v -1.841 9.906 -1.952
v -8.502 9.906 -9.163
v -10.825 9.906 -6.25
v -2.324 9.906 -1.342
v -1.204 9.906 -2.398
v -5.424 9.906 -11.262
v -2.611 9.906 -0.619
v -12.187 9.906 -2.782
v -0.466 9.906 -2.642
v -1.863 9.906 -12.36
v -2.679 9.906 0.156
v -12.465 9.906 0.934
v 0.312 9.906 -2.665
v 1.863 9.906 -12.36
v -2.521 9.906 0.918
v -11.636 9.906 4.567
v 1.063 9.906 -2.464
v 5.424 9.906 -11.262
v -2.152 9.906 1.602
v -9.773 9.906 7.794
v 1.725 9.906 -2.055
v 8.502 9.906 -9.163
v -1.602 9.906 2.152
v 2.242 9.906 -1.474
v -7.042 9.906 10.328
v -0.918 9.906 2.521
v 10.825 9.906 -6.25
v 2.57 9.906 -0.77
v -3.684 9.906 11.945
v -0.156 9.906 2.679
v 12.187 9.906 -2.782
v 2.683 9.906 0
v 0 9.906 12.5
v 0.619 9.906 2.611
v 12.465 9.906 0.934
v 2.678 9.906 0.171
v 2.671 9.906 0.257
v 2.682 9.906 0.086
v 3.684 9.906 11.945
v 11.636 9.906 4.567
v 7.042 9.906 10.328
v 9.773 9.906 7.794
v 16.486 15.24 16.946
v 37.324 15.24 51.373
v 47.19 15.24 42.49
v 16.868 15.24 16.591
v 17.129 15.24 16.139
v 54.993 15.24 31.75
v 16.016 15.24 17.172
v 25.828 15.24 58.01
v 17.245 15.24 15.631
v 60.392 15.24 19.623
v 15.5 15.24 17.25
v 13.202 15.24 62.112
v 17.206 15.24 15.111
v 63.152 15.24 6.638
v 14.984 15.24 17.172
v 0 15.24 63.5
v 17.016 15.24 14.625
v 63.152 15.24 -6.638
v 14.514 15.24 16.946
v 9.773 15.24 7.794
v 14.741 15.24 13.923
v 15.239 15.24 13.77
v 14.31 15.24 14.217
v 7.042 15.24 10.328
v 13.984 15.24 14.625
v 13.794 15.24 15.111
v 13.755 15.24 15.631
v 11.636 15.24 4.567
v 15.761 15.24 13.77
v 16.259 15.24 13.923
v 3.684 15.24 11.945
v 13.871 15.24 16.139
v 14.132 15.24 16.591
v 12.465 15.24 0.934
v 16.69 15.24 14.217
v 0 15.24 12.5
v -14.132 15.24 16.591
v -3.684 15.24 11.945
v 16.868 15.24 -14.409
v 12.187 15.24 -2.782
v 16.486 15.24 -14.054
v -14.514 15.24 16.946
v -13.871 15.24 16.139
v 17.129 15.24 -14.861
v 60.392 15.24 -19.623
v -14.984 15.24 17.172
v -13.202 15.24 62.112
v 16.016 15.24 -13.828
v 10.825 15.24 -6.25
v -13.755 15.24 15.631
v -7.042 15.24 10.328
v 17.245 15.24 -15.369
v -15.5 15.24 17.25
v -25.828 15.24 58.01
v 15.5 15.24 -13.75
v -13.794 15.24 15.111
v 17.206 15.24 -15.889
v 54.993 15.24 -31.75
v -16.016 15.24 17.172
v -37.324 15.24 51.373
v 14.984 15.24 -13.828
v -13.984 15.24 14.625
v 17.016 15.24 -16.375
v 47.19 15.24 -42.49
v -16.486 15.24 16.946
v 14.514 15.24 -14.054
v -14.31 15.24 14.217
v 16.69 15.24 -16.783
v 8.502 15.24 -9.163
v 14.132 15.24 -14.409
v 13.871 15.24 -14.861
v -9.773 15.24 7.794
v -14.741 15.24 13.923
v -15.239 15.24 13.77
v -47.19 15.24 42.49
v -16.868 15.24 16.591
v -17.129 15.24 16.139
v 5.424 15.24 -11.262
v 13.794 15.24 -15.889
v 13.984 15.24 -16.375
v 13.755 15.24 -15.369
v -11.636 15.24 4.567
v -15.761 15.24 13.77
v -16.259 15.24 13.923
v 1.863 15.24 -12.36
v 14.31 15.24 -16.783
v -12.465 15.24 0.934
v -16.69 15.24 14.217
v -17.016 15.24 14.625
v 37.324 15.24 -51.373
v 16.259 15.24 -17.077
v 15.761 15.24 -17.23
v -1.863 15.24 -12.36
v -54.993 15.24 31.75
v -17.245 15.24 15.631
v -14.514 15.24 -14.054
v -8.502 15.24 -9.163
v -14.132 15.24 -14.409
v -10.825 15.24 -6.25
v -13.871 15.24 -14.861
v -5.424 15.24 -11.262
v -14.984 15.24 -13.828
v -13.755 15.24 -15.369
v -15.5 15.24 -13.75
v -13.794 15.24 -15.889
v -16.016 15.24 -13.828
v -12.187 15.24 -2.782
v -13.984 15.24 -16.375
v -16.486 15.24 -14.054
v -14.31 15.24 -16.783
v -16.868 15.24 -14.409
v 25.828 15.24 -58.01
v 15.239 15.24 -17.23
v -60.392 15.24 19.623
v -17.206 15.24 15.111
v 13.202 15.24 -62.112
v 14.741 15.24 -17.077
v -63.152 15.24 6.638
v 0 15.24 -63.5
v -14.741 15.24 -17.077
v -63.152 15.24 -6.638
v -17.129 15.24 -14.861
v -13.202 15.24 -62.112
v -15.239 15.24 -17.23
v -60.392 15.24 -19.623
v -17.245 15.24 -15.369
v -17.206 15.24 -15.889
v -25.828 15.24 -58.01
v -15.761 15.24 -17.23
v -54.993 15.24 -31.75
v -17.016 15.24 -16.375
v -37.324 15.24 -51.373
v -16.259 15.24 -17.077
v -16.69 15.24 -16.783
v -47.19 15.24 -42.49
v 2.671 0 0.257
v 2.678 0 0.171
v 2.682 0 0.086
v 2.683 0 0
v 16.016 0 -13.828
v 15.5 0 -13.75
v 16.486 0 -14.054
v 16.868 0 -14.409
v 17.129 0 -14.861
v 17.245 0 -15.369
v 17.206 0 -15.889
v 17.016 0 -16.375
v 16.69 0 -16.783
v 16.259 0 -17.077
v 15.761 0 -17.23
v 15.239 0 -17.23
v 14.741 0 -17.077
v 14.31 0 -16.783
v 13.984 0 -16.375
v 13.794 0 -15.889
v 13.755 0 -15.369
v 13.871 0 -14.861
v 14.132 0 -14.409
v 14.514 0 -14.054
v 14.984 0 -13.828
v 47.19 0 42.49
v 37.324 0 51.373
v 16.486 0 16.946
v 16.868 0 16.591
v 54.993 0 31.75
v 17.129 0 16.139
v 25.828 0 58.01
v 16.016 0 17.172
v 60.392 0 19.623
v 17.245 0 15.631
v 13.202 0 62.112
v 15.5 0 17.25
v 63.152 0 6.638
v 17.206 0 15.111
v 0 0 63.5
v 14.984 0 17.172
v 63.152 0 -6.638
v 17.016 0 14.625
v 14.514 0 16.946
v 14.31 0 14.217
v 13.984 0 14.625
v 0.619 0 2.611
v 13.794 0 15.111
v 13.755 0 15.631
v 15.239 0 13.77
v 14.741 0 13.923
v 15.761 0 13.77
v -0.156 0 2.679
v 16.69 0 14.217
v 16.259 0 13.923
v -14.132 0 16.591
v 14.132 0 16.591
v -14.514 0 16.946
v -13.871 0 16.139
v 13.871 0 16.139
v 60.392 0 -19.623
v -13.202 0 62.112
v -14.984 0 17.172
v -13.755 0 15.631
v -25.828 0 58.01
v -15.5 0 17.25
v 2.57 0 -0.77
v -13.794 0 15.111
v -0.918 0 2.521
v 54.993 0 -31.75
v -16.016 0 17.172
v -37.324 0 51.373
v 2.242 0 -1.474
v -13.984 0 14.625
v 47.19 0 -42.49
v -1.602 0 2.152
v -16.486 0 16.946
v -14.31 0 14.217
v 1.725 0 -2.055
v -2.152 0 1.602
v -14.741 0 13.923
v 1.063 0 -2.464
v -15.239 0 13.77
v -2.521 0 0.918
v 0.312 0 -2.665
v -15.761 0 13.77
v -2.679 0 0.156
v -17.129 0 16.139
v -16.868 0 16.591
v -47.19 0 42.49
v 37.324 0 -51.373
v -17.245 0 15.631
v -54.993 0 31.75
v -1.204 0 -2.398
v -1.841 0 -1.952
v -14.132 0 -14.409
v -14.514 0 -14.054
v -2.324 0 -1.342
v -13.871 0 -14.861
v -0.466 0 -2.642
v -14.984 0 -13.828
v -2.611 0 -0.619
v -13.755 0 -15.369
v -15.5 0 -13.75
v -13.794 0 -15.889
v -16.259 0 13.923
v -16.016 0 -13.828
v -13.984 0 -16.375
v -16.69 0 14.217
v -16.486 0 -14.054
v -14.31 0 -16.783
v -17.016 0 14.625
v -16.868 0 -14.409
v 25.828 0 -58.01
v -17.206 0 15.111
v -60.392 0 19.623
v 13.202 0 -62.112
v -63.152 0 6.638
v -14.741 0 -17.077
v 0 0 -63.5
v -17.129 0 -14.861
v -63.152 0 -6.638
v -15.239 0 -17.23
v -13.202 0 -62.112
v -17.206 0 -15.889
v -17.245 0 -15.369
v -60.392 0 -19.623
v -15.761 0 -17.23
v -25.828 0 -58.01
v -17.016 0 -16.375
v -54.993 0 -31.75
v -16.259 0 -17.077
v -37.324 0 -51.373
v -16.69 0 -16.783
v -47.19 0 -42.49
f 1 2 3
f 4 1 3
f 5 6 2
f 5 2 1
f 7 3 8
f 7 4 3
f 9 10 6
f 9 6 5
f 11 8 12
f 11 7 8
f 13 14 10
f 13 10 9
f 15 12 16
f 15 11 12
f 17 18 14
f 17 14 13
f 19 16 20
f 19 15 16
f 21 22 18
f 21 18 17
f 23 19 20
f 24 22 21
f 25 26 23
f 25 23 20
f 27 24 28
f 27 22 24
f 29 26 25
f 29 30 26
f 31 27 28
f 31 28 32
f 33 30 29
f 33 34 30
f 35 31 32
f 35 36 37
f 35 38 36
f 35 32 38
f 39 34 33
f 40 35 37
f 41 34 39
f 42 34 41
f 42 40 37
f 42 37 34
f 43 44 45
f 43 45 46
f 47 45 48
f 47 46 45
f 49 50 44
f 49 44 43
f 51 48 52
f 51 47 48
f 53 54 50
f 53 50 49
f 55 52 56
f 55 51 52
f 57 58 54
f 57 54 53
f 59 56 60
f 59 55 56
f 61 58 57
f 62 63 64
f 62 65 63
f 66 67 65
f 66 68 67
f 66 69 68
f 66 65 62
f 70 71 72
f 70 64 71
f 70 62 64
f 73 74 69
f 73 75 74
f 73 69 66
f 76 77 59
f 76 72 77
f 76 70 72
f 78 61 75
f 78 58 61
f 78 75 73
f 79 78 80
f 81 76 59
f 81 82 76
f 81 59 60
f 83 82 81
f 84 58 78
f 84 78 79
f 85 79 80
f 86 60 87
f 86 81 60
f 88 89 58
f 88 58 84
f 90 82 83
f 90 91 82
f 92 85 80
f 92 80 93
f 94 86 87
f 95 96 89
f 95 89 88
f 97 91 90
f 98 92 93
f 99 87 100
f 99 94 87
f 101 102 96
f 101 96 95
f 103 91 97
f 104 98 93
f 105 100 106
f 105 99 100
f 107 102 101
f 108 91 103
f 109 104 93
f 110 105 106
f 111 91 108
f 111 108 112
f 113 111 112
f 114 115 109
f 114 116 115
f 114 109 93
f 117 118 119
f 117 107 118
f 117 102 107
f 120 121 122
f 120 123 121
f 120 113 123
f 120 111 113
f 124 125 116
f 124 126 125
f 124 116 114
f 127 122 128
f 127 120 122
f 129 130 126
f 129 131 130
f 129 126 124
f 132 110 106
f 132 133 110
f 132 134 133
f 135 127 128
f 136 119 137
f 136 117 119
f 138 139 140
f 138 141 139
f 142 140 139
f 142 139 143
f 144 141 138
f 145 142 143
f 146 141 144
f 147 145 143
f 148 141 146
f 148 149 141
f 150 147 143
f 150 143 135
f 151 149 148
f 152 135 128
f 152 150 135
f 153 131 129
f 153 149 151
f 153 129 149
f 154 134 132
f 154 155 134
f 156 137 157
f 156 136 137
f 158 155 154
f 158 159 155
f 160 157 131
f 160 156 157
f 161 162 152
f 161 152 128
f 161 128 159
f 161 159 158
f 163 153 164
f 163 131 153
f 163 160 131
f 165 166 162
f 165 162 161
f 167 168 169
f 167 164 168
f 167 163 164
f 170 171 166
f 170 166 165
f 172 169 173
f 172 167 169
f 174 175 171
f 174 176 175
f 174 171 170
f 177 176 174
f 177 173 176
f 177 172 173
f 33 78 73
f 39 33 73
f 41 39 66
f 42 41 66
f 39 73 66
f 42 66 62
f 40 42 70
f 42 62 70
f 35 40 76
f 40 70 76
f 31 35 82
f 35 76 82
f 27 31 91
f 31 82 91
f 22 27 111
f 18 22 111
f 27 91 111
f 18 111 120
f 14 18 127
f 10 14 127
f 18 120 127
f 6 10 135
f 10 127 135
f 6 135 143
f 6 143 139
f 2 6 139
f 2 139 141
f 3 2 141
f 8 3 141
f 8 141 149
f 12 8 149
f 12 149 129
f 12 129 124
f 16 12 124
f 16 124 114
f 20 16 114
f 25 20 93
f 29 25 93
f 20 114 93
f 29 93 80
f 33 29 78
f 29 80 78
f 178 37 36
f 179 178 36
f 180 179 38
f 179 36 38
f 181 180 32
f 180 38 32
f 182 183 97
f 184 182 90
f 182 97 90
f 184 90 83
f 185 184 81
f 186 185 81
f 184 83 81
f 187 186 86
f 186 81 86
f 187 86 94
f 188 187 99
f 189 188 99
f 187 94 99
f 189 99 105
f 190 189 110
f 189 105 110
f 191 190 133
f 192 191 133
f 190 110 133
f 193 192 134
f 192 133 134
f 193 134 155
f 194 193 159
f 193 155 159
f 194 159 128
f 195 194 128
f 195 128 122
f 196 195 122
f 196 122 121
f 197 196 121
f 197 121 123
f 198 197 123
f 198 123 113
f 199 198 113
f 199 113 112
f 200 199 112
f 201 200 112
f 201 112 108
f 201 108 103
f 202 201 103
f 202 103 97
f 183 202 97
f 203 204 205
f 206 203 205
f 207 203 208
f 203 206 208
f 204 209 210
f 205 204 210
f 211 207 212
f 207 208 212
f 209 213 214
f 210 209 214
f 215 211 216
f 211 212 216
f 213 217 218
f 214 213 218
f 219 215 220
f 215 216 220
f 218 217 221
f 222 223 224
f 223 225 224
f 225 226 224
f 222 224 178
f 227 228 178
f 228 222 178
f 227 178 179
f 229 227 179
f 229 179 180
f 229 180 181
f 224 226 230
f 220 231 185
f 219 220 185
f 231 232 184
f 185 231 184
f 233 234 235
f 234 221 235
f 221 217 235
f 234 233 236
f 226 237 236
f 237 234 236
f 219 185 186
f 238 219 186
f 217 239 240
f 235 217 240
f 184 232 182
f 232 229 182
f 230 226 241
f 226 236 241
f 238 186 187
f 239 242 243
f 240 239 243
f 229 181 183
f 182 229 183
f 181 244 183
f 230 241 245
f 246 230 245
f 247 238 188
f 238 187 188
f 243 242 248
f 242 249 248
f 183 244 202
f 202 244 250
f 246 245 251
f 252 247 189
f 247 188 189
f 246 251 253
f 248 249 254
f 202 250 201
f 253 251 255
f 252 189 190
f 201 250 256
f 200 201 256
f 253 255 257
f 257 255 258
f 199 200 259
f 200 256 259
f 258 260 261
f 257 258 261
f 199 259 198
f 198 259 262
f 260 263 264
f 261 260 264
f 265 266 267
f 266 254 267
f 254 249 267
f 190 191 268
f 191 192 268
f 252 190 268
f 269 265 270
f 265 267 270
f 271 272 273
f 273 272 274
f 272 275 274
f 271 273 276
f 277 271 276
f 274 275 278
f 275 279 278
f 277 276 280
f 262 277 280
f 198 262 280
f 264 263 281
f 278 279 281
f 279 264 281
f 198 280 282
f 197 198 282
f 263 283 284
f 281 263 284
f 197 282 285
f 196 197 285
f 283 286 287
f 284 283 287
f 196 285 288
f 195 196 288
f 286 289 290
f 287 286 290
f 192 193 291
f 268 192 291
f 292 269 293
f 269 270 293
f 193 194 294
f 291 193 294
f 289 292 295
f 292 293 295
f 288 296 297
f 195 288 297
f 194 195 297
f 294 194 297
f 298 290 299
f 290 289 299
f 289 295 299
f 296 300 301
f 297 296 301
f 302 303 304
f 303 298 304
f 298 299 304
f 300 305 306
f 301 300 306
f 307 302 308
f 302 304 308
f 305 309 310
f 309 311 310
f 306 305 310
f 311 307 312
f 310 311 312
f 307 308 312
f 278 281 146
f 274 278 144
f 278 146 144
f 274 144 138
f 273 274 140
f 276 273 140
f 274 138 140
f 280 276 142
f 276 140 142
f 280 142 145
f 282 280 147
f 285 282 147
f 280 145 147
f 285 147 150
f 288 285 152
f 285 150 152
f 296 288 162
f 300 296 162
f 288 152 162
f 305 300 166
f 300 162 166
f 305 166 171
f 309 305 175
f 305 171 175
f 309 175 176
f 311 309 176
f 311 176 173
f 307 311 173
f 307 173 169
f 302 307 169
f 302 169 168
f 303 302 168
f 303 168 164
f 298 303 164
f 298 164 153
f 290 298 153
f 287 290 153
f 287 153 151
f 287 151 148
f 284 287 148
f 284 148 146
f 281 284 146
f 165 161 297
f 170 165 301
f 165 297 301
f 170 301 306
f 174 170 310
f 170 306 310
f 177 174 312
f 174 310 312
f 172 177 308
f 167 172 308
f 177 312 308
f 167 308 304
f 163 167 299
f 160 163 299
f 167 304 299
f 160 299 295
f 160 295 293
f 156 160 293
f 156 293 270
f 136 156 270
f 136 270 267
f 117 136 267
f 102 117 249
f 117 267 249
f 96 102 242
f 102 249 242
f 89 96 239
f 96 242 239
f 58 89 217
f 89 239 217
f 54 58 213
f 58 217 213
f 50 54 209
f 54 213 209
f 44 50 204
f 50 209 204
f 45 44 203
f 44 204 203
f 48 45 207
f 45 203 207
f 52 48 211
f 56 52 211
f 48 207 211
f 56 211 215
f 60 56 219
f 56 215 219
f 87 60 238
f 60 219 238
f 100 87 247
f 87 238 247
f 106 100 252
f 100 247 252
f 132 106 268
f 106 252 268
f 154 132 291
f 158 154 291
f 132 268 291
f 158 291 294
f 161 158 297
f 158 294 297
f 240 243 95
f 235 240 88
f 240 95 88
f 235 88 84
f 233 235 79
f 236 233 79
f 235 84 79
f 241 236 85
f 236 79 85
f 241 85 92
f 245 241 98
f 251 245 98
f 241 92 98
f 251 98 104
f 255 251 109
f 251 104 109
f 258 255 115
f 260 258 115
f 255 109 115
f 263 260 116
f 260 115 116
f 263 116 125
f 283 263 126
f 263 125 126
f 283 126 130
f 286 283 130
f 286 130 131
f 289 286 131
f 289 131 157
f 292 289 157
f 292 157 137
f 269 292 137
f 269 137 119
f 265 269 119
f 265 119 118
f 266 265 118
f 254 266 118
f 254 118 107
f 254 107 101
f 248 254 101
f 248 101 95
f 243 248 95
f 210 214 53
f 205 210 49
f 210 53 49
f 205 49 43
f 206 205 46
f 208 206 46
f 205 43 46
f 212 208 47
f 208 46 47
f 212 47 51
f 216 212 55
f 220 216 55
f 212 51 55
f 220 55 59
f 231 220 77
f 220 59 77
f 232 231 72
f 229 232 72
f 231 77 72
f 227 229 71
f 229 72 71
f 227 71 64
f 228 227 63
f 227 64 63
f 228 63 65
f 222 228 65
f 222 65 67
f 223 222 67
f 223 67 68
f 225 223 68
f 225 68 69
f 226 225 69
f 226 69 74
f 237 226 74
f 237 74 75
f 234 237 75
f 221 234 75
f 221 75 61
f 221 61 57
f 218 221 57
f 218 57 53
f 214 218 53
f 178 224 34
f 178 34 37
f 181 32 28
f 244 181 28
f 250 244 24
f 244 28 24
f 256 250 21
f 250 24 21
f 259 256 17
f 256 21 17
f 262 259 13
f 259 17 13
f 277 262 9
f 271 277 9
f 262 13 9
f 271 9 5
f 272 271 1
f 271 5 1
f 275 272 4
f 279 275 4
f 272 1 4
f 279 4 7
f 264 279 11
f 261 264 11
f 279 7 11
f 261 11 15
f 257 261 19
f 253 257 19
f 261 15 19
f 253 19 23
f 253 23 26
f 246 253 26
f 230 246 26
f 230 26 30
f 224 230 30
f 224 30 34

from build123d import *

# Parameters (mm, degrees)
SKETCH2_R           = 63.5
BOSS_EXTRUDE1_DEPTH = 15.24
CUT_EXTRUDE3_DEPTH  = 92.086539071
SKETCH4_R           = 1.75
CUT_EXTRUDE4_DEPTH  = 55.626
SKETCH5_R           = 12.5
CUT_EXTRUDE5_DEPTH  = 5.334


with BuildPart() as part:
    # Sketch2 → Boss-Extrude1 (new body)
    with BuildSketch(Plane(origin=(0, 0, 0), x_dir=(1, 0, 0), z_dir=(0, 1, 0))):
        Circle(SKETCH2_R)
    extrude(amount=BOSS_EXTRUDE1_DEPTH)

    # Sketch3 → Cut-Extrude3 (cut, through all)
    with BuildSketch(Plane(origin=(0, 15.24, 0), x_dir=(1, 0, 0), z_dir=(0, 1, 0))):
        with BuildLine():
            ThreePointArc((2.683094535, 0), (-2.104641397, 1.664175734), (0.618701471, -2.610786237))
            Line((0.618701471, -2.610786237), (2.670795382, -0.25660926))
            ThreePointArc((2.670795382, -0.25660926), (2.680017983, -0.128451918), (2.683094535, 0))
        make_face()
    extrude(amount=-CUT_EXTRUDE3_DEPTH, mode=Mode.SUBTRACT)

    # Sketch4 → Cut-Extrude4 (cut)
    with BuildSketch(Plane(origin=(0, 15.24, 0), x_dir=(1, 0, 0), z_dir=(0, 1, 0))):
        with Locations((-15.5, 15.5)):
            Circle(SKETCH4_R)
        with Locations((15.5, 15.5)):
            Circle(SKETCH4_R)
        with Locations((15.5, -15.5)):
            Circle(SKETCH4_R)
        with Locations((-15.5, -15.5)):
            Circle(SKETCH4_R)
    extrude(amount=-CUT_EXTRUDE4_DEPTH, mode=Mode.SUBTRACT)

    # Sketch5 → Cut-Extrude5 (cut)
    with BuildSketch(Plane(origin=(0, 15.24, 0), x_dir=(1, 0, 0), z_dir=(0, 1, 0))):
        Circle(SKETCH5_R)
    extrude(amount=-CUT_EXTRUDE5_DEPTH, mode=Mode.SUBTRACT)


solid = part.part
